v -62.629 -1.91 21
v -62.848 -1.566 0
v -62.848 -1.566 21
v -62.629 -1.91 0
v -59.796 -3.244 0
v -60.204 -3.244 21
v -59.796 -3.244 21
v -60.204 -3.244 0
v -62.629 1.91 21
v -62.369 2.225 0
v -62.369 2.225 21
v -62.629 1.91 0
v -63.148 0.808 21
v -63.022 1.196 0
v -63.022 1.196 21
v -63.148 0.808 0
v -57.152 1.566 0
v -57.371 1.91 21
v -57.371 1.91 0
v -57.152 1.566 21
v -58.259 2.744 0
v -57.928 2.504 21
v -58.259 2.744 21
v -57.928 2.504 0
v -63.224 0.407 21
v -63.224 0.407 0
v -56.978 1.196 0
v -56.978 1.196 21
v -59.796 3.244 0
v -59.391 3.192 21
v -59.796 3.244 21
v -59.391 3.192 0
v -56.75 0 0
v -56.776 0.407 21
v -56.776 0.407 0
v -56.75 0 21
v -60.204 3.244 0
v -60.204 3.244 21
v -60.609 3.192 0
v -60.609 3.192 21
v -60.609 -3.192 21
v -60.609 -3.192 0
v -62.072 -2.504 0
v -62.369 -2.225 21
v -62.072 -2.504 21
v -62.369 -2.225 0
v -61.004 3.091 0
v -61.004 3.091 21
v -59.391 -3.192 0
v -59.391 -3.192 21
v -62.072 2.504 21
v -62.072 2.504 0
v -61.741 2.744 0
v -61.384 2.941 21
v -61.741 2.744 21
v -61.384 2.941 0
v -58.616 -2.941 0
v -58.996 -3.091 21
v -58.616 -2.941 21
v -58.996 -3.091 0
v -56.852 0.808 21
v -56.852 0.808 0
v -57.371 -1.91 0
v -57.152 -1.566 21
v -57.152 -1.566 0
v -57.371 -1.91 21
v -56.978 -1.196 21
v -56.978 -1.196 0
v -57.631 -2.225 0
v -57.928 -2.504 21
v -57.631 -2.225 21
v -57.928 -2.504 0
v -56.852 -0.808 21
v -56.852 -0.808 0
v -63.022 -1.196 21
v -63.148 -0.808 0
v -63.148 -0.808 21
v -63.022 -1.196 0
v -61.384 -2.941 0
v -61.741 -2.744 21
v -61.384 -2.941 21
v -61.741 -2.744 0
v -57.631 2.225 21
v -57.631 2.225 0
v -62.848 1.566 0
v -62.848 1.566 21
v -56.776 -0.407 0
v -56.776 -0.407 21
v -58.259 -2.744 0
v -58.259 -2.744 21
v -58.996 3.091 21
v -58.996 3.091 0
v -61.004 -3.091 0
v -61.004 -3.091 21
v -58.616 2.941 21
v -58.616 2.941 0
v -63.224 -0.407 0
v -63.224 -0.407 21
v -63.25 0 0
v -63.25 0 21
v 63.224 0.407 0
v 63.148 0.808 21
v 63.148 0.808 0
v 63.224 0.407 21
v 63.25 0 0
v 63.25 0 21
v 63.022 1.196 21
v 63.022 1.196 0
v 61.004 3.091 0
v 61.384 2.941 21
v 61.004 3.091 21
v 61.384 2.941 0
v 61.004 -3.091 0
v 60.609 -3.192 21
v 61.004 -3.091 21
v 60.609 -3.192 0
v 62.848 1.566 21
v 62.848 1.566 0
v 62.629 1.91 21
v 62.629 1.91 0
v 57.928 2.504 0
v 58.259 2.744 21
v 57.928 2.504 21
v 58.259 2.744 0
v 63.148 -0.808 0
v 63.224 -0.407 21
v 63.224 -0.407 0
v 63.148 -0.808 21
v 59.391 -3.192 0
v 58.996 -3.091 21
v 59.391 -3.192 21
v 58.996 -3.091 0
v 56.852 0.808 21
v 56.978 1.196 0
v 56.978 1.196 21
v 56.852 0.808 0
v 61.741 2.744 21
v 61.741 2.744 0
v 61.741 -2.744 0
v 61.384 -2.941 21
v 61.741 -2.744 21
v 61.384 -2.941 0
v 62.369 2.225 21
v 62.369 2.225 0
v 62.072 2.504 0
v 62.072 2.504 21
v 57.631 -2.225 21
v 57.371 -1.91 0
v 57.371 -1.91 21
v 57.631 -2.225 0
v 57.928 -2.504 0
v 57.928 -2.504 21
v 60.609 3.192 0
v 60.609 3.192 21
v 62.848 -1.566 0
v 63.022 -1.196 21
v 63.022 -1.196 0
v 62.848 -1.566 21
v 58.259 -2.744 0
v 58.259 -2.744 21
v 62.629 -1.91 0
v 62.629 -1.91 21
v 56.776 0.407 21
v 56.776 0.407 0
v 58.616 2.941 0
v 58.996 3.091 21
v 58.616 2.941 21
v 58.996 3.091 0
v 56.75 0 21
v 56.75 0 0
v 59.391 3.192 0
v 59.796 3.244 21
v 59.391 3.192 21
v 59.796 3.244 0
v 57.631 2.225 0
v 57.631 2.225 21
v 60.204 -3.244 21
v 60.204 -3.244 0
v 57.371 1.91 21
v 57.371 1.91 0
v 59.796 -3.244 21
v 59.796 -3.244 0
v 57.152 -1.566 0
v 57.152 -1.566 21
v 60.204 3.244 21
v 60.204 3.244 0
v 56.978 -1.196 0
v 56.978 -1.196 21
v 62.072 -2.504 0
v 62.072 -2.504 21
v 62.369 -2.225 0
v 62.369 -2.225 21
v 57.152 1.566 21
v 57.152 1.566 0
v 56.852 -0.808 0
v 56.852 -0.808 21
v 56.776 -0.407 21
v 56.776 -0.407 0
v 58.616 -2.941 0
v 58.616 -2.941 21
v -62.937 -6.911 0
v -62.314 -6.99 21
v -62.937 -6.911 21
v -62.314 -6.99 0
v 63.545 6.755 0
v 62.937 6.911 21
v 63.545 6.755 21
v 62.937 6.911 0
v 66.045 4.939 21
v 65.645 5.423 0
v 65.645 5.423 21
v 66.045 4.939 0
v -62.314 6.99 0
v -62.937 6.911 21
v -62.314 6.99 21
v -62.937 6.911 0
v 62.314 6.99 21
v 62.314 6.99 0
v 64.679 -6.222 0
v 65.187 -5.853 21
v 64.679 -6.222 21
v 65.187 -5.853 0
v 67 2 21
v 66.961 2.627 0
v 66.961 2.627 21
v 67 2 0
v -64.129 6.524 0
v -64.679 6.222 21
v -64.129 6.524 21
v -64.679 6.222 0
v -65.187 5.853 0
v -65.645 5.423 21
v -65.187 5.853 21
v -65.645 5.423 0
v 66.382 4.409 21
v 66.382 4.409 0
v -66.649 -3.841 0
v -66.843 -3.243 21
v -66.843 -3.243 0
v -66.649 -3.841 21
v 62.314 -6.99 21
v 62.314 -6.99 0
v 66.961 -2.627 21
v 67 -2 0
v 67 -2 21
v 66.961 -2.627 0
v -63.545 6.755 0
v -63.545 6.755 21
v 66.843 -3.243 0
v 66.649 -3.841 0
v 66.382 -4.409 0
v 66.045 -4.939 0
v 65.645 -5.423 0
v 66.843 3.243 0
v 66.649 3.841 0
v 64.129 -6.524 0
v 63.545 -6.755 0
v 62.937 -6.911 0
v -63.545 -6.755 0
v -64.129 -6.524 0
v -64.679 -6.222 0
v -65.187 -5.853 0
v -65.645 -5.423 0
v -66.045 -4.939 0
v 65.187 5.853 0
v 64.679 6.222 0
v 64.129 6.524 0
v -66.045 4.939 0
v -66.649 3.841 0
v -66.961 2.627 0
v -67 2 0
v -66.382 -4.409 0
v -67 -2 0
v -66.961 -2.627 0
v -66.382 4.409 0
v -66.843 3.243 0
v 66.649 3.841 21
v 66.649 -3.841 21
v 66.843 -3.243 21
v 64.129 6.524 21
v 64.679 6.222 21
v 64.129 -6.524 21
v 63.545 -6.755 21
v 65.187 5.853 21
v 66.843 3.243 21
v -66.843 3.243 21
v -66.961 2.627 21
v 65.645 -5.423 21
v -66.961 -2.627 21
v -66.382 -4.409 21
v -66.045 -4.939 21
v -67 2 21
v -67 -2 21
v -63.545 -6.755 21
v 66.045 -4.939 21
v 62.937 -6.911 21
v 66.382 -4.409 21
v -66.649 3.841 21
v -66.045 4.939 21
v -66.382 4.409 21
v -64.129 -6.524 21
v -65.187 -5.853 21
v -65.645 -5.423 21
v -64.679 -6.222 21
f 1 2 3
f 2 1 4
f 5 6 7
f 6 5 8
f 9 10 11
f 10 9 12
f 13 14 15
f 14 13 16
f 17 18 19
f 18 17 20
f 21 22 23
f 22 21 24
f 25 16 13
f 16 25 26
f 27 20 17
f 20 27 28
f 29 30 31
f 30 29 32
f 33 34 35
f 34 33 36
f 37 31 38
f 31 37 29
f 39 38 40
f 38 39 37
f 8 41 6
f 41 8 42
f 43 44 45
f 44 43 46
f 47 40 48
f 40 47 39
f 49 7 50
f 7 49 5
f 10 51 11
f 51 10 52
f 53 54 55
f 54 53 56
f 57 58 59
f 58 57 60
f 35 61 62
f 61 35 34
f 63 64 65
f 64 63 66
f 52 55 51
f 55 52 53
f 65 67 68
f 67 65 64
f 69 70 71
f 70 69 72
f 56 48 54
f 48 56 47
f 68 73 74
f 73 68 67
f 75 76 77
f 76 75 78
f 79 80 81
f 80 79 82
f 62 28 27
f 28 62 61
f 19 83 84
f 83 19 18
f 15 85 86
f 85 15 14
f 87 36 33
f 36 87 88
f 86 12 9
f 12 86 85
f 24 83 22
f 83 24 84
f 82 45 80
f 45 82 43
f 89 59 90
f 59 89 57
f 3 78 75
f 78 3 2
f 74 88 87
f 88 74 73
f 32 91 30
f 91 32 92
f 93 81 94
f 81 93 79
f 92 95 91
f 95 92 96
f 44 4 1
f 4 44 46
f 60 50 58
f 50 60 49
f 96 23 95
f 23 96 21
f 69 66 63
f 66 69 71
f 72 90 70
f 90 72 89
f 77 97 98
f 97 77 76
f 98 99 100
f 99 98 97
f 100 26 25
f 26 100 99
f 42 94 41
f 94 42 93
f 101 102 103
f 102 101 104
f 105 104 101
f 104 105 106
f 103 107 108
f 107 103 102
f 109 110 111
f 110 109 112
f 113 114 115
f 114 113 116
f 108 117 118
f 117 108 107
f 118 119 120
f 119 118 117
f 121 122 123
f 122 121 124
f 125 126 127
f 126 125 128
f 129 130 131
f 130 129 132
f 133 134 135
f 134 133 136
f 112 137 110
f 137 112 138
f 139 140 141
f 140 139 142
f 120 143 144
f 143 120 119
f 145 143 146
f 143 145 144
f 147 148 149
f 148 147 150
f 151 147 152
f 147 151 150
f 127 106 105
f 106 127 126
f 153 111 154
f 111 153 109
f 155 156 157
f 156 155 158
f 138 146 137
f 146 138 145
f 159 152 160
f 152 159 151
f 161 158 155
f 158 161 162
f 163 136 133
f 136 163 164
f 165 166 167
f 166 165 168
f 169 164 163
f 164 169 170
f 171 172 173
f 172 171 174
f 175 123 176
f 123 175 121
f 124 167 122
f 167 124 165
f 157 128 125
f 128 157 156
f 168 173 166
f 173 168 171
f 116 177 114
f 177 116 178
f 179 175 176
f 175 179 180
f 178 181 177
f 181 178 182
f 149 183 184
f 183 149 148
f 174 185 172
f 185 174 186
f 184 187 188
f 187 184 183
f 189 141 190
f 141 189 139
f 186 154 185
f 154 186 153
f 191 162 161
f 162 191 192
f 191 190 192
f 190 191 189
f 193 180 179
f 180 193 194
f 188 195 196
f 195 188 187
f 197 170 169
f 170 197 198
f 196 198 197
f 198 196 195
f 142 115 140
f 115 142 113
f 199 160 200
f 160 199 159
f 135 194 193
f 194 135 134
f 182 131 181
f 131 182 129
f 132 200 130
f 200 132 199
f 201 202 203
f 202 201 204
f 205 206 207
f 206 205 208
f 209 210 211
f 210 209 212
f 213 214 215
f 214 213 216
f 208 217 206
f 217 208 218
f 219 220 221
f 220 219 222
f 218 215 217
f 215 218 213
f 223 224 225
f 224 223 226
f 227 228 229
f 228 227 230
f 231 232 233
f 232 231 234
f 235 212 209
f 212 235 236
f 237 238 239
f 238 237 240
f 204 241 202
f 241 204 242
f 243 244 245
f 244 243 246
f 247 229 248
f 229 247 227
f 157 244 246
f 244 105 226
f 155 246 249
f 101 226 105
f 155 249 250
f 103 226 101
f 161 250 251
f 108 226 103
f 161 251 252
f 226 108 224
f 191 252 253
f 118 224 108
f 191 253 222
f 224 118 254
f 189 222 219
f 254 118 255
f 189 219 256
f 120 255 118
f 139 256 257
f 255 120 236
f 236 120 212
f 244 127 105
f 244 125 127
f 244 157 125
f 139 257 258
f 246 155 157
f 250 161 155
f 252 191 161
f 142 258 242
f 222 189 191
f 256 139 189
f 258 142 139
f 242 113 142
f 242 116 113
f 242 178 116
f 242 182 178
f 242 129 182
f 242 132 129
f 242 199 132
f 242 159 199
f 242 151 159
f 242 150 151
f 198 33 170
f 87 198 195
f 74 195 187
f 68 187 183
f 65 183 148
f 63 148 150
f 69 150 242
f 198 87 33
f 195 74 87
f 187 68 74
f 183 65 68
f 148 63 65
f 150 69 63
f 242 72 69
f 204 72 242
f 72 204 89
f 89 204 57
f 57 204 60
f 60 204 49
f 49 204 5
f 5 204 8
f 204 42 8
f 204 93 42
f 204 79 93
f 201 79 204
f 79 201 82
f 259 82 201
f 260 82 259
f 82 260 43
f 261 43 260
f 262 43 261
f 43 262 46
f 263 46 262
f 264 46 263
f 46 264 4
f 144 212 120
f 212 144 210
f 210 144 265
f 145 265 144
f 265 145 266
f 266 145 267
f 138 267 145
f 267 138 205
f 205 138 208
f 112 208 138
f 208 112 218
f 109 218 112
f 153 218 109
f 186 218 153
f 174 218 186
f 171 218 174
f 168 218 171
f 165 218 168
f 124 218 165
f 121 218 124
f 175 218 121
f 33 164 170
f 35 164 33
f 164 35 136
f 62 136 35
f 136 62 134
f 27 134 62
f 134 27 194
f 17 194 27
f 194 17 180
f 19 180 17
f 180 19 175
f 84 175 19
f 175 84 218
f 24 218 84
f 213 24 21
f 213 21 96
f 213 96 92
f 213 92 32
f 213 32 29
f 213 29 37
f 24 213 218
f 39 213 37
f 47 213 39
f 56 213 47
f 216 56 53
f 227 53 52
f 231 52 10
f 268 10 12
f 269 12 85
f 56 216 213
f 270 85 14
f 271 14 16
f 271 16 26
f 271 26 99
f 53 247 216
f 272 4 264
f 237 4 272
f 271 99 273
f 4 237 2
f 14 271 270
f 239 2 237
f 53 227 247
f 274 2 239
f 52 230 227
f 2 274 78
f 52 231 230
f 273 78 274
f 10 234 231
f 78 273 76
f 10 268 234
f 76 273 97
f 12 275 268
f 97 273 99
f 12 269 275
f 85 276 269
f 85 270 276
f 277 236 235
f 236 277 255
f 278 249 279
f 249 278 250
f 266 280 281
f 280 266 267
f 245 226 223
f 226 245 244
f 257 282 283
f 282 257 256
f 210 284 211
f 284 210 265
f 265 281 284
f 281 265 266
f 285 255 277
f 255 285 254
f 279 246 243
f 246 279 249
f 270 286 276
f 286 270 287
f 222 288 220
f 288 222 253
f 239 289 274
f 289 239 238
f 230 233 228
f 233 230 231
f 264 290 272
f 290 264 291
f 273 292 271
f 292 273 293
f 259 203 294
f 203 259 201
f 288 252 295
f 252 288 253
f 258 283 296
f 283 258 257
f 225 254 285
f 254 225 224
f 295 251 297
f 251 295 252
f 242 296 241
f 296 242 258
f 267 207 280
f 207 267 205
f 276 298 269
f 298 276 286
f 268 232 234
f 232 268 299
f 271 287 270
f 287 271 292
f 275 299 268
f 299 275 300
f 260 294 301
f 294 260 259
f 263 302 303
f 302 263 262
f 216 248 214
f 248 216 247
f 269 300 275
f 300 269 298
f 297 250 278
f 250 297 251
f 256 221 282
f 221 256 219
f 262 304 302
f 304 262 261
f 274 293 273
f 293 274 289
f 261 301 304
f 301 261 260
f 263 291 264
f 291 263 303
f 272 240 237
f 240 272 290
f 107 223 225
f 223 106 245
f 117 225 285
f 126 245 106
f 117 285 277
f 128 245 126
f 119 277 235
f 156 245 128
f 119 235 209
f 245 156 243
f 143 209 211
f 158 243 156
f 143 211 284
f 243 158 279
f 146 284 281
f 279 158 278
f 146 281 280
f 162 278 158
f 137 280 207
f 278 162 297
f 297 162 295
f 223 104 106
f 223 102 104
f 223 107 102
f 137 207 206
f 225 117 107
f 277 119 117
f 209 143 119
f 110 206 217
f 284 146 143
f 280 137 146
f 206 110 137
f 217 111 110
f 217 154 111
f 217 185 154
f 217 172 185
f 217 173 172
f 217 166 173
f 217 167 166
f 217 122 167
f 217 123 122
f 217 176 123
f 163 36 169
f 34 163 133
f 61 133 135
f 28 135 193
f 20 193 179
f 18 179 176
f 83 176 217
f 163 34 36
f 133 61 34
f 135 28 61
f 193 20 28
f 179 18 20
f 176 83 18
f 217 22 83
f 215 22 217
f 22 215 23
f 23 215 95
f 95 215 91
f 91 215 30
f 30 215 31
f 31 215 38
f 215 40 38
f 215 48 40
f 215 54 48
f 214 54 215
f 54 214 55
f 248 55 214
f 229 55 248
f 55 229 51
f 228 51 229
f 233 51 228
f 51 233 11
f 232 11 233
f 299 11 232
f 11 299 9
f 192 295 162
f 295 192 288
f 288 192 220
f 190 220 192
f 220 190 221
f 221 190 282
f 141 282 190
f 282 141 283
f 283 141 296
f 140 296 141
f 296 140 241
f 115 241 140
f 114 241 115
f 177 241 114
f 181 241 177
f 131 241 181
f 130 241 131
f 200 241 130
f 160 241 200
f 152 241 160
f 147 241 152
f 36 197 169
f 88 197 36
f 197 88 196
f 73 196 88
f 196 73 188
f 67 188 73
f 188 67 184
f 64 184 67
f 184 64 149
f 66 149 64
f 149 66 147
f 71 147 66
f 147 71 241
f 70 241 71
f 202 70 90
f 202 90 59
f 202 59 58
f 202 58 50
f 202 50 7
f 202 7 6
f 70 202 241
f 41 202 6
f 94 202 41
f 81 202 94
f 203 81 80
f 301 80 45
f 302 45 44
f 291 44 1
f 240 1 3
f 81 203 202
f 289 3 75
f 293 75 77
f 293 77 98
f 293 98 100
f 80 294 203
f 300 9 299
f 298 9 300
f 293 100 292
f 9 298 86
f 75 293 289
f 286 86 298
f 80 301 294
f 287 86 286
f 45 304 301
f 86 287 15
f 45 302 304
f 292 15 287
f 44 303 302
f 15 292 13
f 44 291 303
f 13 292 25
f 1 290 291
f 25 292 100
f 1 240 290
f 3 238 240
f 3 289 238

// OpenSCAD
$fn = 50;


difference() {
	union() {
		hull() {
			translate(v = [-62.0000000000, 2.0000000000, 0]) {
				cylinder(h = 21, r = 5);
			}
			translate(v = [62.0000000000, 2.0000000000, 0]) {
				cylinder(h = 21, r = 5);
			}
			translate(v = [-62.0000000000, -2.0000000000, 0]) {
				cylinder(h = 21, r = 5);
			}
			translate(v = [62.0000000000, -2.0000000000, 0]) {
				cylinder(h = 21, r = 5);
			}
		}
	}
	union() {
		translate(v = [-60.0000000000, 0.0000000000, -100.0000000000]) {
			cylinder(h = 200, r = 3.2500000000);
		}
		translate(v = [-60.0000000000, 0.0000000000, -100.0000000000]) {
			cylinder(h = 200, r = 3.2500000000);
		}
		translate(v = [60.0000000000, 0.0000000000, -100.0000000000]) {
			cylinder(h = 200, r = 3.2500000000);
		}
		translate(v = [60.0000000000, 0.0000000000, -100.0000000000]) {
			cylinder(h = 200, r = 3.2500000000);
		}
	}
}
